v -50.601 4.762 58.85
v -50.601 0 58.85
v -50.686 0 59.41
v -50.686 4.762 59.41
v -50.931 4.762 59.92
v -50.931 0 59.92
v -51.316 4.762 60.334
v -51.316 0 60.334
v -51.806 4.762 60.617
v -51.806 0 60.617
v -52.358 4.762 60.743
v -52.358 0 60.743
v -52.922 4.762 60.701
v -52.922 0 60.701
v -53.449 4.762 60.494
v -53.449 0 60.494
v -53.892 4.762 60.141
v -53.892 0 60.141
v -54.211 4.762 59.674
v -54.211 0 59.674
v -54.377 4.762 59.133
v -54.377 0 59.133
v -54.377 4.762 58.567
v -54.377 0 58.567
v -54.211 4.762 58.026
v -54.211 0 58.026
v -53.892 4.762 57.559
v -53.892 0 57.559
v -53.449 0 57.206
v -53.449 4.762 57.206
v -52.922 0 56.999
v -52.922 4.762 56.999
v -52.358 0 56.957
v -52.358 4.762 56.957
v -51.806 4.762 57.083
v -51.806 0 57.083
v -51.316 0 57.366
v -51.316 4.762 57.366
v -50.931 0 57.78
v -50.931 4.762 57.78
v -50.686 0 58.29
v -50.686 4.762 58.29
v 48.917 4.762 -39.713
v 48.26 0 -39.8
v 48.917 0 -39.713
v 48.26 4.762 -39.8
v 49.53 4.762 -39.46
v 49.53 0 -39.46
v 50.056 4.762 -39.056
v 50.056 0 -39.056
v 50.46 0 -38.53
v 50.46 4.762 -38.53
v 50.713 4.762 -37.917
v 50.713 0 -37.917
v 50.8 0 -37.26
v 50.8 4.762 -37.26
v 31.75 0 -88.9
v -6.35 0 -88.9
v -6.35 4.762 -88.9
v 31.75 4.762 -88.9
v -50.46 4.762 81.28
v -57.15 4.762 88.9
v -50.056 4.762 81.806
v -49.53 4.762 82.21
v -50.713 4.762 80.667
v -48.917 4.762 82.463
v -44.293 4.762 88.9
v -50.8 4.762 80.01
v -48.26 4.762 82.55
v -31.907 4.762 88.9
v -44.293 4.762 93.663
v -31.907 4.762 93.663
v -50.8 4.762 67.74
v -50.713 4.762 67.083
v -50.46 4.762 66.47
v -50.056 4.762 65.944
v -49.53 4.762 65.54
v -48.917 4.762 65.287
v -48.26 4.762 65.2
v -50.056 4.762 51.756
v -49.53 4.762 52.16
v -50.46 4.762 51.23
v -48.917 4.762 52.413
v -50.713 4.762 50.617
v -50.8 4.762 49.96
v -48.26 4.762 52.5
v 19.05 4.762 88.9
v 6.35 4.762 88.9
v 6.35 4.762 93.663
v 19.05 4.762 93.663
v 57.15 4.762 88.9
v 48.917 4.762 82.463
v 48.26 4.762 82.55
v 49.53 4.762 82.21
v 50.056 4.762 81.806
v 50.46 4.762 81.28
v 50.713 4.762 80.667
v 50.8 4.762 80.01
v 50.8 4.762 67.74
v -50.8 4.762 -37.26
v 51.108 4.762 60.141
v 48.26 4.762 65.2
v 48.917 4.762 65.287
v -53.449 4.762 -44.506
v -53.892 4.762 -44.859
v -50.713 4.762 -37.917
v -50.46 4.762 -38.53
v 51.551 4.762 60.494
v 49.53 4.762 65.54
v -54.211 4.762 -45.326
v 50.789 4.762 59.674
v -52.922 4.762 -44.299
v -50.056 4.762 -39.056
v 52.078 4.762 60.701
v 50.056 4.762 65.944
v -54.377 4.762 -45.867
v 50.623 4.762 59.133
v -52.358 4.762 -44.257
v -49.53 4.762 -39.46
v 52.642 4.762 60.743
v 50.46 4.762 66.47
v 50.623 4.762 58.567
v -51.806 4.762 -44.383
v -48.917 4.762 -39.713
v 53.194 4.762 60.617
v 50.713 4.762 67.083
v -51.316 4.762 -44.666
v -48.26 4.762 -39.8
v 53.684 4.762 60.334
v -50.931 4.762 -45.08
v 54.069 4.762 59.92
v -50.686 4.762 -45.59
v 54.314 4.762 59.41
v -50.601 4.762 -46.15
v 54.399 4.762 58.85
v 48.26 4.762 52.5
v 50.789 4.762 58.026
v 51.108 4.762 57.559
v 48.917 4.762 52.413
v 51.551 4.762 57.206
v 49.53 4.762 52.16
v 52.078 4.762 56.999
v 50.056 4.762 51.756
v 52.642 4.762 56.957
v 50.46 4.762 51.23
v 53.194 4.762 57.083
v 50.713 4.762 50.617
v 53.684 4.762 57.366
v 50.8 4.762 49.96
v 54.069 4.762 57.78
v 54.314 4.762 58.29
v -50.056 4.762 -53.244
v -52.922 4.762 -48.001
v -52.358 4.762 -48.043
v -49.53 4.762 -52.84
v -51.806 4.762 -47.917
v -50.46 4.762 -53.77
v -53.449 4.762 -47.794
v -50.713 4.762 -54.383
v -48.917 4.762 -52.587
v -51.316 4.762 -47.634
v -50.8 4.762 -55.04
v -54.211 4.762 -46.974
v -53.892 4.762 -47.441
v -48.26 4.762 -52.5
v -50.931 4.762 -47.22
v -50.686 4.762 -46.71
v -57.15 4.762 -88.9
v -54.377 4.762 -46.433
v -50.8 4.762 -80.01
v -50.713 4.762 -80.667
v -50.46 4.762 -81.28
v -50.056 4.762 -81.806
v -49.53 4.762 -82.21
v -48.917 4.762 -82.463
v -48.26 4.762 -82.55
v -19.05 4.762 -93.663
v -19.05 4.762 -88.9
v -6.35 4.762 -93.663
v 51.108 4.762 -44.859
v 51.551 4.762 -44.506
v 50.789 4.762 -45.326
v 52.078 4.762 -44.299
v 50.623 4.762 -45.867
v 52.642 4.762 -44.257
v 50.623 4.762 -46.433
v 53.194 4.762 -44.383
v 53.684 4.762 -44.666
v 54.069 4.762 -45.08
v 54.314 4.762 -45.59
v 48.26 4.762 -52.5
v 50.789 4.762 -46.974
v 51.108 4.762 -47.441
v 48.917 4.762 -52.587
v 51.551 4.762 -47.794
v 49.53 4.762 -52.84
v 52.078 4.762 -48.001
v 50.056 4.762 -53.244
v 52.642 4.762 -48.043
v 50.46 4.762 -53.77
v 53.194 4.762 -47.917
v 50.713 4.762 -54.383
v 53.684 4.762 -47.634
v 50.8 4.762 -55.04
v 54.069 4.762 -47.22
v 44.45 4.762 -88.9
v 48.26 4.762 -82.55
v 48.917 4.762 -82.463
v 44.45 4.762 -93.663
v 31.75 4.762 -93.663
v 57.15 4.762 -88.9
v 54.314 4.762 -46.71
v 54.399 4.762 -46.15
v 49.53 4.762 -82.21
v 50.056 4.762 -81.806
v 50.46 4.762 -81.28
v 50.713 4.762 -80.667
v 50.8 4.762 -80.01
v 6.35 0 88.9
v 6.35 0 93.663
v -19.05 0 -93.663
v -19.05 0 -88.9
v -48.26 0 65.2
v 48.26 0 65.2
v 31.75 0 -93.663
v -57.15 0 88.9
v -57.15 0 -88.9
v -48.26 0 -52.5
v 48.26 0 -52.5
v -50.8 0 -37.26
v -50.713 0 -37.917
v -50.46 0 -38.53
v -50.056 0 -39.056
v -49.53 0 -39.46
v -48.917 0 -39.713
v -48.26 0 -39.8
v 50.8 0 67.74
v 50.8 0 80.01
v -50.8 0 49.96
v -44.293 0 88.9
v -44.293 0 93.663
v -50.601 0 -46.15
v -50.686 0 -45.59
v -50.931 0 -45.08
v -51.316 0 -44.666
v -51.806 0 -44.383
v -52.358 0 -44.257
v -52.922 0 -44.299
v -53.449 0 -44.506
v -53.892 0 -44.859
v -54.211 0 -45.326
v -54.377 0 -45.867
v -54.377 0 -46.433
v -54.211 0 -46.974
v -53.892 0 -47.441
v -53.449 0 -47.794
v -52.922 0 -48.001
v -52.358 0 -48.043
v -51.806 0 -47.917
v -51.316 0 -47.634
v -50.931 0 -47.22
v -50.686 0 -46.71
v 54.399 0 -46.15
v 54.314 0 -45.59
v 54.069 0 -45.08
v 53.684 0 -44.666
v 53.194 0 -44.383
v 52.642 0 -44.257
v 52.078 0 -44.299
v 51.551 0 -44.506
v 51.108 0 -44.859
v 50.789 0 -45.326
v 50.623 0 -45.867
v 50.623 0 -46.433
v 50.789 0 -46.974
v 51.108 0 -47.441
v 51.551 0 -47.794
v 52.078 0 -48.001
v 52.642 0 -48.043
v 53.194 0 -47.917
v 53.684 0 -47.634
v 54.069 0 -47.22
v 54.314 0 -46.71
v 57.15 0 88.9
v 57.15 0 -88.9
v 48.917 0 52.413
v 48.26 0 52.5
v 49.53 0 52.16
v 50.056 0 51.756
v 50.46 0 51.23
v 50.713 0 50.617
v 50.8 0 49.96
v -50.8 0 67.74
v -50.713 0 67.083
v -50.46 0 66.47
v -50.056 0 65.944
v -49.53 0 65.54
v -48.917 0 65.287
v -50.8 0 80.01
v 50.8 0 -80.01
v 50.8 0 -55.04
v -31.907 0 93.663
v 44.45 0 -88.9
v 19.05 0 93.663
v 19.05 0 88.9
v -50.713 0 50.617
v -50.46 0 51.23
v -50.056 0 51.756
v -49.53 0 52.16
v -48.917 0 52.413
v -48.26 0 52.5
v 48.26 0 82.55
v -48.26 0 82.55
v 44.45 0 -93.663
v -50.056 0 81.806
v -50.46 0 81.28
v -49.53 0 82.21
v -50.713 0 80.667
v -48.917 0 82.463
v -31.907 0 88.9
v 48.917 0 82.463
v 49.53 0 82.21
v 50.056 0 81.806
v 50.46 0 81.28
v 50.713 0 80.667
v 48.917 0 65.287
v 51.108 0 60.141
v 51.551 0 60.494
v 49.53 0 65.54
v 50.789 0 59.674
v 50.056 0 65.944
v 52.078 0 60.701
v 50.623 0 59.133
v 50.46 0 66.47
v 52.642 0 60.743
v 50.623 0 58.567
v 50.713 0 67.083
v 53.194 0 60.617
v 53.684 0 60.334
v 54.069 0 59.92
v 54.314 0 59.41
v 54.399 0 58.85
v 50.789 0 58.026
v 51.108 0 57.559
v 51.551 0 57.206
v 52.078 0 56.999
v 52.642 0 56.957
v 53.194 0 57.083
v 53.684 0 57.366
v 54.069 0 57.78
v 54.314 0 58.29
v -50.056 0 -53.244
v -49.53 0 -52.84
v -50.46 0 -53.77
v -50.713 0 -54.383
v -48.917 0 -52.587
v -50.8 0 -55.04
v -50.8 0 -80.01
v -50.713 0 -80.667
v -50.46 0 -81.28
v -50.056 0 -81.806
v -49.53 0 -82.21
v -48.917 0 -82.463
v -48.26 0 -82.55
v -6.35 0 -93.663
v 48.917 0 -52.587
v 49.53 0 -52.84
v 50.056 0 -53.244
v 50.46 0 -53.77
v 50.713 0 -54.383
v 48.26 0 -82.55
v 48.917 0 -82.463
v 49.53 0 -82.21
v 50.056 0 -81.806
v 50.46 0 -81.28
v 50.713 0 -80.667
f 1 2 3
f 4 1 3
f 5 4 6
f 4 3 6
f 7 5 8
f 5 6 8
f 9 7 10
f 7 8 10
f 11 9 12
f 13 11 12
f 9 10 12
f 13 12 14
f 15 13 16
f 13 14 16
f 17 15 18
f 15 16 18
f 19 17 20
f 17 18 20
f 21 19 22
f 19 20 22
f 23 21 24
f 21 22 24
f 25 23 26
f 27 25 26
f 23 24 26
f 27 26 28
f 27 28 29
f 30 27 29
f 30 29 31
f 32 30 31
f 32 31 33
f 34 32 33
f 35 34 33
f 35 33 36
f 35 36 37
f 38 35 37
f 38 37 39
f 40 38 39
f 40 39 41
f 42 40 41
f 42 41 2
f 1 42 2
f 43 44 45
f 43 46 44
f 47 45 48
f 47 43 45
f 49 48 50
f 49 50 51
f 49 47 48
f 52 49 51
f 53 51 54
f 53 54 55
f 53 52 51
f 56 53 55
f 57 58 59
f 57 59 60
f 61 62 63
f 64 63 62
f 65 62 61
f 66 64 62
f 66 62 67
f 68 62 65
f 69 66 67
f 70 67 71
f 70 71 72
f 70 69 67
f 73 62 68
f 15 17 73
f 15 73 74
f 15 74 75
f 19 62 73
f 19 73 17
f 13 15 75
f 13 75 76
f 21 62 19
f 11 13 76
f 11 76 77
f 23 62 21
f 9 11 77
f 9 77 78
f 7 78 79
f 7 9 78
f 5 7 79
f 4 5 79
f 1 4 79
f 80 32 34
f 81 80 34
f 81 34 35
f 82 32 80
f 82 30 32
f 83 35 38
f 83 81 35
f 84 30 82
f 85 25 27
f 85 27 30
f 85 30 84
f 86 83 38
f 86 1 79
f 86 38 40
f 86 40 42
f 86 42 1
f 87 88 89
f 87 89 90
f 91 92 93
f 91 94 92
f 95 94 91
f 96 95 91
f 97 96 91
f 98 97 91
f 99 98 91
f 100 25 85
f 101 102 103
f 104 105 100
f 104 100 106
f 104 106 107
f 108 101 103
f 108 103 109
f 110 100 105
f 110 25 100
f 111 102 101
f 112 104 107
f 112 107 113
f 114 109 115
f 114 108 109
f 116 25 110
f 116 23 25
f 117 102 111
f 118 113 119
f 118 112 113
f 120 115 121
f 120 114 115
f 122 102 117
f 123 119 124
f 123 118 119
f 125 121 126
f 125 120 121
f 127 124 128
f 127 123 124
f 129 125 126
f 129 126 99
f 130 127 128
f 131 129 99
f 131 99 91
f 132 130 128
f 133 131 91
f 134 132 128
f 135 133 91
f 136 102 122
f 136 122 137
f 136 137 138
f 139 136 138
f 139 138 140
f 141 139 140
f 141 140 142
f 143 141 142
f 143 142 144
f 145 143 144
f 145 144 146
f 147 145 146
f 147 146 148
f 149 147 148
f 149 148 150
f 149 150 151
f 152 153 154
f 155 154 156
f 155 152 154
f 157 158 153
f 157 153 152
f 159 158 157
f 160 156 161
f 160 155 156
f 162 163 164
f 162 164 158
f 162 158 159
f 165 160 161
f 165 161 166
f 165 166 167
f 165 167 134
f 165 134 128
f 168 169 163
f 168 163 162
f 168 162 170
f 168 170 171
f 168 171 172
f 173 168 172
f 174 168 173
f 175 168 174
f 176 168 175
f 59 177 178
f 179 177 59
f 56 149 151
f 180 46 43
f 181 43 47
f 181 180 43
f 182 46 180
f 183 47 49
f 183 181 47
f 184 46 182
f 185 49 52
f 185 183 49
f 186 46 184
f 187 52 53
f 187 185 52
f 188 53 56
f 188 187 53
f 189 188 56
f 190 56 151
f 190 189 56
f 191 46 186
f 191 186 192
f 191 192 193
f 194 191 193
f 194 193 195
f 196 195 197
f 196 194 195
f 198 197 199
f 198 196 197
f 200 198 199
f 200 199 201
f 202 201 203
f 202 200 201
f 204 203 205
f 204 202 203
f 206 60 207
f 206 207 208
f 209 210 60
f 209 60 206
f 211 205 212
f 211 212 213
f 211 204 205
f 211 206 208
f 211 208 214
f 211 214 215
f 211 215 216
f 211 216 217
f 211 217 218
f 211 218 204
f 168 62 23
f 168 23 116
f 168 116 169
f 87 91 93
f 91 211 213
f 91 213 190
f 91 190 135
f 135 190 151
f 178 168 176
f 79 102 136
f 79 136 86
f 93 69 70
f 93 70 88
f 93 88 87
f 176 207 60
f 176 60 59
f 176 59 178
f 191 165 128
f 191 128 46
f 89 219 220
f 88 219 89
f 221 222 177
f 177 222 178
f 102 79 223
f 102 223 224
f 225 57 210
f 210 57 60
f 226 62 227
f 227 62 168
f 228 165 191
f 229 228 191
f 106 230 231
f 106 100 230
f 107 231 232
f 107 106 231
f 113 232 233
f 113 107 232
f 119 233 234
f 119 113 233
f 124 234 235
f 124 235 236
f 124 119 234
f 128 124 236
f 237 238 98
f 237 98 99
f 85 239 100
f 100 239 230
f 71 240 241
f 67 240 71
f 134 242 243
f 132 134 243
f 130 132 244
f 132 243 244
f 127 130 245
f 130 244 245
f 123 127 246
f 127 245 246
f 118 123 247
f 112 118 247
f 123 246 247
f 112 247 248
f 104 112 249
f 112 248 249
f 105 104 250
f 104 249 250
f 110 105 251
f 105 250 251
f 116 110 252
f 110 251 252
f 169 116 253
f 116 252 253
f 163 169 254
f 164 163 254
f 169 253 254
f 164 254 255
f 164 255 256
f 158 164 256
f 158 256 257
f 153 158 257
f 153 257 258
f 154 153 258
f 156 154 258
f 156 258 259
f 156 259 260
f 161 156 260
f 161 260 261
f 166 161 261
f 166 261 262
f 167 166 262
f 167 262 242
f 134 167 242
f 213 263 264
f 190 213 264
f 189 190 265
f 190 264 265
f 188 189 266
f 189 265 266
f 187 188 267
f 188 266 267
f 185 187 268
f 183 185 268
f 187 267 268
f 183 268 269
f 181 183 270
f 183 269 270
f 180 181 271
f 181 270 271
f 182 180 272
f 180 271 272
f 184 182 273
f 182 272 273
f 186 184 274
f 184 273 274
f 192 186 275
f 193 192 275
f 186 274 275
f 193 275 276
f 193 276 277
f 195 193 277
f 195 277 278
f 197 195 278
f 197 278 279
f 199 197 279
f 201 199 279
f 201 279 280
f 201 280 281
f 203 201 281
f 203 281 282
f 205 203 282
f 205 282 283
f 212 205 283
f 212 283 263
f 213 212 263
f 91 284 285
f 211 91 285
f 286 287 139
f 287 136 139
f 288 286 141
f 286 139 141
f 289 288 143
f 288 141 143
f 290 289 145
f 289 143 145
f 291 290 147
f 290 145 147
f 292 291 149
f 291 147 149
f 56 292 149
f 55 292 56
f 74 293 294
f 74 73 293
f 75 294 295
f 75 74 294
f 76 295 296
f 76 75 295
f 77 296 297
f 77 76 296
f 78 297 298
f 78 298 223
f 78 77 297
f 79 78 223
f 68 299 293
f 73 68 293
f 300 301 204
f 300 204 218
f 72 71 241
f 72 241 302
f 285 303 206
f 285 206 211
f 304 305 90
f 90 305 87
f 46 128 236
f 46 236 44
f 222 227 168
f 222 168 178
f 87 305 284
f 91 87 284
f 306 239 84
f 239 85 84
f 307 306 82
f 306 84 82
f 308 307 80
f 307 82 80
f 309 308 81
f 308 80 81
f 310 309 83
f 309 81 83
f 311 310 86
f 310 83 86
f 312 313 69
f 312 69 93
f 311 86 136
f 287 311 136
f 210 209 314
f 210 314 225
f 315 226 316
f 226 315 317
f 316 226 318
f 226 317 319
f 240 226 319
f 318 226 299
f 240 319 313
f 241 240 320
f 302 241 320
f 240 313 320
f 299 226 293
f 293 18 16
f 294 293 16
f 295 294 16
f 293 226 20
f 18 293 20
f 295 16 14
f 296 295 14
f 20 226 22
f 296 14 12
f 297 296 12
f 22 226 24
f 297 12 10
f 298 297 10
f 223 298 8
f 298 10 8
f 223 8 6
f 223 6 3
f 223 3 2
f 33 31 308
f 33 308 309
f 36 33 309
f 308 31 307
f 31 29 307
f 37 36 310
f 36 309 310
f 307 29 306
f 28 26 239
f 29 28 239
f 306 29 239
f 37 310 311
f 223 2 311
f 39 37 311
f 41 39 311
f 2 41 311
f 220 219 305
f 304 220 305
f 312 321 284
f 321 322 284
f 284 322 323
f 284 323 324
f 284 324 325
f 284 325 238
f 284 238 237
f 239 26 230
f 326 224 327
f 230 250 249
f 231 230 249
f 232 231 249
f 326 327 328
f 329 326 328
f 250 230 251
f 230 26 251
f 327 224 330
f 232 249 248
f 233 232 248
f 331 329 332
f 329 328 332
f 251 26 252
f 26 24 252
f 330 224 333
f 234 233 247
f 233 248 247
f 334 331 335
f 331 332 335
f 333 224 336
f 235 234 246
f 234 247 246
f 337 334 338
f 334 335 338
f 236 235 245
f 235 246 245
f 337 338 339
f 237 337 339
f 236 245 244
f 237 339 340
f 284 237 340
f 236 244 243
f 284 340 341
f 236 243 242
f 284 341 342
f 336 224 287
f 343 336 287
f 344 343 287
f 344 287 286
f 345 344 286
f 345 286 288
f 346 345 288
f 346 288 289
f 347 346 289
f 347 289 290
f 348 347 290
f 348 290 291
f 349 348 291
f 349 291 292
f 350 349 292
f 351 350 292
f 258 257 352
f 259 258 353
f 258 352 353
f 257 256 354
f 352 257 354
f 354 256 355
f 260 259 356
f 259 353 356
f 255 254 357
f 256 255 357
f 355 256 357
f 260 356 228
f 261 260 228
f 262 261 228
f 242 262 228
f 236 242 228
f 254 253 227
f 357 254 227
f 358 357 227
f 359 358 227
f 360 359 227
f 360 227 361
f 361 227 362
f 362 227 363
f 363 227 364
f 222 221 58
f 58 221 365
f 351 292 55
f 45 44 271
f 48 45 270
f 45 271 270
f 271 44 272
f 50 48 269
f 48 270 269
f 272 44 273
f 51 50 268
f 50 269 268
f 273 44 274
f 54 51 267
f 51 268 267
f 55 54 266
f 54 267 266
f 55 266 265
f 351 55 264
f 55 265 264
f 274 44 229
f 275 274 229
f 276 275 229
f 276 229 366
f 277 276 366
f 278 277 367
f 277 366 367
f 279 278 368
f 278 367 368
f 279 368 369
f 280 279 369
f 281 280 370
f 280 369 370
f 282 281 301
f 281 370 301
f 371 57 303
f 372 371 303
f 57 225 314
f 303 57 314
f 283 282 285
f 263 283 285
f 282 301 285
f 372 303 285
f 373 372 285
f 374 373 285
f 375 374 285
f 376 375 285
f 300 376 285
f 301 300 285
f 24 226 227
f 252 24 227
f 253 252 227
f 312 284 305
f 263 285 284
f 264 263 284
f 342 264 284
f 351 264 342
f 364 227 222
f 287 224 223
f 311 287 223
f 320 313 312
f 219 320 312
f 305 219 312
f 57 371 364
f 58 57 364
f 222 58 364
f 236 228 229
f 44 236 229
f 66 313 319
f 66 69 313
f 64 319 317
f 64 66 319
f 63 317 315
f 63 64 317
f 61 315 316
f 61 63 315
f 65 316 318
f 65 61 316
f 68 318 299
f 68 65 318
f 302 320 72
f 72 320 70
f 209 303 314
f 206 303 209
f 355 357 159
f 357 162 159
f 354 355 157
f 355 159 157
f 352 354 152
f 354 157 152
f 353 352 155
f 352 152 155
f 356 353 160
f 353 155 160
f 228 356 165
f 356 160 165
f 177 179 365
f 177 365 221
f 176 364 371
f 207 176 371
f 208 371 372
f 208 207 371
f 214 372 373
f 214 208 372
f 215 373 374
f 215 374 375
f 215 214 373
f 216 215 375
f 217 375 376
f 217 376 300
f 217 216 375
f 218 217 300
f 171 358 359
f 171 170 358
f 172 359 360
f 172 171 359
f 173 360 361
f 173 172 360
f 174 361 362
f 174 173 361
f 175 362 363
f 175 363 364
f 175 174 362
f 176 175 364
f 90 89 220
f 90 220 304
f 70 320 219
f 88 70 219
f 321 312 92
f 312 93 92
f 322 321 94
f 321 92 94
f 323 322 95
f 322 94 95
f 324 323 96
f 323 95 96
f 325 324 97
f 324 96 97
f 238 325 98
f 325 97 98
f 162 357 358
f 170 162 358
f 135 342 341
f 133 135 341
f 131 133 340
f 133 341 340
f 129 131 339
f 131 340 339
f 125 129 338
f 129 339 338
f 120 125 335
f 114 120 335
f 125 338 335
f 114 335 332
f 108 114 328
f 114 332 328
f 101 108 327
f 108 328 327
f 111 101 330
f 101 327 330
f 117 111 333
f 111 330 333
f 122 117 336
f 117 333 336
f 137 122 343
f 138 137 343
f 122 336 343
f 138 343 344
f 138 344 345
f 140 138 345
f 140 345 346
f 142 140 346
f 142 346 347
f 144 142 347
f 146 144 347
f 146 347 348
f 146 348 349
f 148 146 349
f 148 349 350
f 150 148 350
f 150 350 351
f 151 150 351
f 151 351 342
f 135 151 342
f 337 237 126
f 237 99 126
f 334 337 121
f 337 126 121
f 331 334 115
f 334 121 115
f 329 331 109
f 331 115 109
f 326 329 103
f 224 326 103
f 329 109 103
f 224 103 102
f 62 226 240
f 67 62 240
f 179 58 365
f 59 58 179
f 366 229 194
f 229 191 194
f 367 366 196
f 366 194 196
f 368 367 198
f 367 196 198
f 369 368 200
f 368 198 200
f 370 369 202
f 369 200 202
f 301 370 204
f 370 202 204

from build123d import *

# Parameters (mm, degrees)
SKETCH1_W                 = 114.3
SKETCH1_H                 = 177.8
SKETCH1_W_2               = 101.6
SKETCH1_H_2               = 165.1
BOSS_EXTRUDE1_DEPTH       = 4.7625
SKETCH2_W                 = 12.38677804
SKETCH2_H                 = 4.7625
SKETCH2_W_2               = 12.7
BOSS_EXTRUDE2_DEPTH       = 4.7625
SKETCH3_W                 = 12.7
SKETCH3_H                 = 4.7625
BOSS_EXTRUDE3_DEPTH       = 4.7625
FILLET1_R                 = 2.54
SKETCH4_W                 = 114.3
SKETCH4_H                 = 12.7
BOSS_EXTRUDE4_DEPTH       = 4.7625
F_6_CLEARANCE_HOLE1_D     = 3.7973
F_6_CLEARANCE_HOLE1_DEPTH = 25.4
F_6_CLEARANCE_HOLE1_TIP   = 1.140824014
FILLET2_R                 = 2.54


with BuildPart() as part:
    # Sketch1 → Boss-Extrude1 (new body)
    with BuildSketch(Plane(origin=(0, 0, 0), x_dir=(1, 0, 0), z_dir=(0, 1, 0))):
        Rectangle(SKETCH1_W, SKETCH1_H)
        Rectangle(SKETCH1_W_2, SKETCH1_H_2, mode=Mode.SUBTRACT)
    extrude(amount=BOSS_EXTRUDE1_DEPTH)

    # Sketch2 → Boss-Extrude2 (add)
    with BuildSketch(Plane.XY.offset(88.9)):
        with Locations((-38.1, 2.38125)):
            Rectangle(SKETCH2_W, SKETCH2_H)
        with Locations((12.7, 2.38125)):
            Rectangle(SKETCH2_W_2, SKETCH2_H)
    extrude(amount=BOSS_EXTRUDE2_DEPTH)

    # Sketch3 → Boss-Extrude3 (add)
    with BuildSketch(Plane(origin=(0, 0, -88.9), x_dir=(-1, 0, 0), z_dir=(0, 0, -1))):
        with Locations((-38.1, 2.38125)):
            Rectangle(SKETCH3_W, SKETCH3_H)
        with Locations((12.7, 2.38125)):
            Rectangle(SKETCH3_W, SKETCH3_H)
    extrude(amount=BOSS_EXTRUDE3_DEPTH)

    # Fillet1
    fillet1_edges = [part.edges().sort_by_distance(p)[0] for p in [
        (50.8, 2.38125, 82.55),
        (50.8, 2.38125, -82.55),
        (-50.8, 2.38125, -82.55),
        (-50.8, 2.38125, 82.55),
    ]]
    fillet(fillet1_edges, radius=FILLET1_R)

    # Sketch4 → Boss-Extrude4 (add)
    with BuildSketch(Plane(origin=(0, 4.7625, 0), x_dir=(1, 0, 0), z_dir=(0, 1, 0))):
        with Locations((0, 46.149999902)):
            Rectangle(SKETCH4_W, SKETCH4_H)
        with Locations((0, -58.849999902)):
            Rectangle(SKETCH4_W, SKETCH4_H)
    extrude(amount=-BOSS_EXTRUDE4_DEPTH)

    # #6 Clearance Hole1
    with Locations(Plane(origin=(0, 4.7625, 0), x_dir=(-1, 0, 0), z_dir=(0, 1, 0))):
        with Locations((52.5, -46.149999902), (-52.5, -46.149999902), (52.5, 58.849999902), (-52.5, 58.849999902)):
            Hole(F_6_CLEARANCE_HOLE1_D / 2, depth=F_6_CLEARANCE_HOLE1_DEPTH)
            with Locations((0, 0, -(F_6_CLEARANCE_HOLE1_DEPTH + F_6_CLEARANCE_HOLE1_TIP / 2))):  # 118° drill point
                Cone(0, F_6_CLEARANCE_HOLE1_D / 2, F_6_CLEARANCE_HOLE1_TIP, mode=Mode.SUBTRACT)

    # Fillet2
    fillet2_edges = [part.edges().sort_by_distance(p)[0] for p in [
        (-50.8, 2.38125, -39.799999902),
        (-50.8, 2.38125, -52.499999902),
        (50.8, 2.38125, -52.499999902),
        (50.8, 2.38125, -39.799999902),
        (-50.8, 2.38125, 65.199999902),
        (-50.8, 2.38125, 52.499999902),
        (50.8, 2.38125, 52.499999902),
        (50.8, 2.38125, 65.199999902),
    ]]
    fillet(fillet2_edges, radius=FILLET2_R)


solid = part.part
